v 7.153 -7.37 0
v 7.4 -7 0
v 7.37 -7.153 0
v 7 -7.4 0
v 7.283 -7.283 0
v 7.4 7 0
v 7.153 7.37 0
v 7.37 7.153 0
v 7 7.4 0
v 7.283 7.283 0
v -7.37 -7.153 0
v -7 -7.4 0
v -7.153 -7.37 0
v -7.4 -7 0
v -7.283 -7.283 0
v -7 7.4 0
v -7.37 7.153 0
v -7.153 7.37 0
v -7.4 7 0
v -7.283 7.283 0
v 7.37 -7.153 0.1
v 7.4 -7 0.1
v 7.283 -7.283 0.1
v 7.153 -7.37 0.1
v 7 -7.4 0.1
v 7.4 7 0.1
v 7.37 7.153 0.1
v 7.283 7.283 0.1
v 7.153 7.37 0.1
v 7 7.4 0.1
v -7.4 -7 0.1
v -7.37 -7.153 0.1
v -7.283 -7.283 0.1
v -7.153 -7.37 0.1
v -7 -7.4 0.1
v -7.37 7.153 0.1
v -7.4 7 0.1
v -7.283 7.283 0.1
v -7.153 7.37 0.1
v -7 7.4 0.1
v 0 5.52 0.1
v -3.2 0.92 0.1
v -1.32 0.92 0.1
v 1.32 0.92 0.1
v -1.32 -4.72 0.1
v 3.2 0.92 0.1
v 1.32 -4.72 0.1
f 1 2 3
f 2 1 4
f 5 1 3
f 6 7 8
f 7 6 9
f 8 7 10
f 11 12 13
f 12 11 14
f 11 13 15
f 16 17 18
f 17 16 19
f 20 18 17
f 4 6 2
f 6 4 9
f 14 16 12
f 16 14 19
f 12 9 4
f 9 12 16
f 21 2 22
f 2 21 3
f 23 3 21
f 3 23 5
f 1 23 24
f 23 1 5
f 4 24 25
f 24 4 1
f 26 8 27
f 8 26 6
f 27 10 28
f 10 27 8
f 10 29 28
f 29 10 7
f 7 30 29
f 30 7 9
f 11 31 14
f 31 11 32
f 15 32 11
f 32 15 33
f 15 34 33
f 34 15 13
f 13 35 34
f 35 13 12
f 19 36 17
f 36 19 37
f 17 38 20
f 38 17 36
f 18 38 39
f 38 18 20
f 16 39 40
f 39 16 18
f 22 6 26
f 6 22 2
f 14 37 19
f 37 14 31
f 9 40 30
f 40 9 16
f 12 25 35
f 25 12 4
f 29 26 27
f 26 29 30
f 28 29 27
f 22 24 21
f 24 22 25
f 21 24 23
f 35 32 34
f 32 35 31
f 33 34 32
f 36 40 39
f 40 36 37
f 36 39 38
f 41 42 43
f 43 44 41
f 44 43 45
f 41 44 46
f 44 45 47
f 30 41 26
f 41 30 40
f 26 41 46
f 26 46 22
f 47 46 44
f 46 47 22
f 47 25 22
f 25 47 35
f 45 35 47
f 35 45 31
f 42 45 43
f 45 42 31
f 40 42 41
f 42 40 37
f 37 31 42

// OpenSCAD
// file: ../p/1-4cyli.scad
use <../lib.scad>
function ldraw_lib__1_4cyli() = [
// 0 Cylinder 0.25
// 0 Name: 1-4cyli.dat
// 0 Author: James Jessiman
// 0 !LDRAW_ORG Primitive UPDATE 2012-01
// 0 !LICENSE Licensed under CC BY 4.0 : see CAreadme.txt
// 
// 0 BFC CERTIFY CCW
  [0,"BFC","CERTIFY"],
  [0,"BFC","CCW"],
// 
// 0 !HISTORY 2002-03-23 [sbliss] Added BFC statement.
// 0 !HISTORY 2002-04-25 [PTadmin] Official Update 2002-02
// 0 !HISTORY 2007-06-22 [PTadmin] Header formatted for Contributor Agreement
// 0 !HISTORY 2008-07-01 [PTadmin] Official Update 2008-01
// 0 !HISTORY 2012-02-16 [Philo] Changed to CCW
// 0 !HISTORY 2012-03-30 [PTadmin] Official Update 2012-01
// 
// 
// 4 16 1 1 0 0.9239 1 0.3827 0.9239 0 0.3827 1 0 0
  [4,16,1,1,0,0.9239,1,0.3827,0.9239,0,0.3827,1,0,0],
// 5 24 1 0 0 1 1 0 0.9239 0 0.3827 1 0 -1
  [5,24,1,0,0,1,1,0,0.9239,0,0.3827,1,0,-1],
// 4 16 0.9239 1 0.3827 0.7071 1 0.7071 0.7071 0 0.7071 0.9239 0 0.3827
  [4,16,0.9239,1,0.3827,0.7071,1,0.7071,0.7071,0,0.7071,0.9239,0,0.3827],
// 5 24 0.9239 0 0.3827 0.9239 1 0.3827 0.7071 0 0.7071 1 0 0
  [5,24,0.9239,0,0.3827,0.9239,1,0.3827,0.7071,0,0.7071,1,0,0],
// 4 16 0.7071 1 0.7071 0.3827 1 0.9239 0.3827 0 0.9239 0.7071 0 0.7071
  [4,16,0.7071,1,0.7071,0.3827,1,0.9239,0.3827,0,0.9239,0.7071,0,0.7071],
// 5 24 0.7071 0 0.7071 0.7071 1 0.7071 0.3827 0 0.9239 0.9239 0 0.3827
  [5,24,0.7071,0,0.7071,0.7071,1,0.7071,0.3827,0,0.9239,0.9239,0,0.3827],
// 4 16 0.3827 1 0.9239 0 1 1 0 0 1 0.3827 0 0.9239
  [4,16,0.3827,1,0.9239,0,1,1,0,0,1,0.3827,0,0.9239],
// 5 24 0.3827 0 0.9239 0.3827 1 0.9239 0 0 1 0.7071 0 0.7071
  [5,24,0.3827,0,0.9239,0.3827,1,0.9239,0,0,1,0.7071,0,0.7071],
// 5 24 0 0 1 0 1 1 0.3827 0 0.9239 -1 0 1
  [5,24,0,0,1,0,1,1,0.3827,0,0.9239,-1,0,1],
];
module ldraw_lib__1_4cyli(step=0, col=false, unit=2/5, alt=false, line=0.2, solid=!$preview)
    makepoly(ldraw_lib__1_4cyli(), step=step, col=col, unit=unit, alt=alt, line=line, solid=solid);
ldraw_lib__1_4cyli(line=0.2);
// file: ../p/1-4chrd.scad
use <../lib.scad>
function ldraw_lib__1_4chrd() = [
// 0 Chord 0.25
// 0 Name: 1-4chrd.dat
// 0 Author: Max Martin Richter [MMR1988]
// 0 !LDRAW_ORG Primitive UPDATE 2023-05
// 0 !LICENSE Licensed under CC BY 4.0 : see CAreadme.txt
// 
// 0 BFC CERTIFY CCW
  [0,"BFC","CERTIFY"],
  [0,"BFC","CCW"],
// 
// 0 !HISTORY 2004-04-22 [PTadmin] Official Update 2004-02
// 0 !HISTORY 2007-10-09 [PTadmin] Header formatted for Contributor Agreement
// 0 !HISTORY 2008-07-01 [PTadmin] Official Update 2008-01
// 0 !HISTORY 2012-08-02 [MMR1988] Re-creation with PrimGen2 and Rectifier
// 0 !HISTORY 2012-08-09 [PTadmin] Official Update 2012-02
// 0 !HISTORY 2023-10-27 [OrionP] Change author to MMR1988 from hafhead
// 0 !HISTORY 2023-10-31 [OrionP] Official Update 2023-05
// 
// 4 16 0.9239 0 0.3827 0.3827 0 0.9239 0 0 1 1 0 0
  [4,16,0.9239,0,0.3827,0.3827,0,0.9239,0,0,1,1,0,0],
// 3 16 0.7071 0 0.7071 0.3827 0 0.9239 0.9239 0 0.3827
  [3,16,0.7071,0,0.7071,0.3827,0,0.9239,0.9239,0,0.3827],
];
module ldraw_lib__1_4chrd(step=0, col=false, unit=2/5, alt=false, line=0.2, solid=!$preview)
    makepoly(ldraw_lib__1_4chrd(), step=step, col=col, unit=unit, alt=alt, line=line, solid=solid);
ldraw_lib__1_4chrd(line=0.2);
// main file
use <../lib.scad>
use <../p/1-4chrd.scad>
use <../p/1-4cyli.scad>
function ldraw_lib__6429457g() = [
// 0 Sticker  1.9 x  1.9 with Yellow Arrow on Black Background
// 0 Name: 6429457g.dat
// 0 Author: Gabriel Läufer [Dr.Bricktacular]
// 0 !LDRAW_ORG Part UPDATE 2025-02
// 0 !LICENSE Licensed under CC BY 4.0 : see CAreadme.txt
// 
// 0 BFC CERTIFY CCW
  [0,"BFC","CERTIFY"],
  [0,"BFC","CCW"],
// 
// 0 !KEYWORDS Blacktron Cruiser, Blacktron I, Bricklink 40580stk01
// 0 !KEYWORDS Brickowl 402277, Rebrickable 10102362, Set 40580
// 
// 0 !HISTORY 2025-02-27 [OrionP] Official Update 2025-02
// 
// 0 // Sticker-Bottom
// 1 16 17.5 0 -17.5 1 0 0 0 -1 0 0 0 -1 1-4chrd.dat
  [1,16,17.5,0,-17.5,1,0,0,0,-1,0,0,0,-1, ldraw_lib__1_4chrd()],
// 1 16 17.5 0 17.5 1 0 0 0 -1 0 0 0 1 1-4chrd.dat
  [1,16,17.5,0,17.5,1,0,0,0,-1,0,0,0,1, ldraw_lib__1_4chrd()],
// 1 16 -17.5 0 -17.5 -1 0 0 0 -1 0 0 0 -1 1-4chrd.dat
  [1,16,-17.5,0,-17.5,-1,0,0,0,-1,0,0,0,-1, ldraw_lib__1_4chrd()],
// 1 16 -17.5 0 17.5 -1 0 0 0 -1 0 0 0 1 1-4chrd.dat
  [1,16,-17.5,0,17.5,-1,0,0,0,-1,0,0,0,1, ldraw_lib__1_4chrd()],
// 4 16 18.5 0 17.5 18.5 0 -17.5 17.5 0 -18.5 17.5 0 18.5
  [4,16,18.5,0,17.5,18.5,0,-17.5,17.5,0,-18.5,17.5,0,18.5],
// 4 16 -18.5 0 17.5 -17.5 0 18.5 -17.5 0 -18.5 -18.5 0 -17.5
  [4,16,-18.5,0,17.5,-17.5,0,18.5,-17.5,0,-18.5,-18.5,0,-17.5],
// 4 16 17.5 0 18.5 17.5 0 -18.5 -17.5 0 -18.5 -17.5 0 18.5
  [4,16,17.5,0,18.5,17.5,0,-18.5,-17.5,0,-18.5,-17.5,0,18.5],
// 
// 0 // Sticker-Side
// 1 16 17.5 -0.25 -17.5 1 0 0 0 0.25 0 0 0 -1 1-4cyli.dat
  [1,16,17.5,-0.25,-17.5,1,0,0,0,0.25,0,0,0,-1, ldraw_lib__1_4cyli()],
// 1 16 17.5 -0.25 17.5 1 0 0 0 0.25 0 0 0 1 1-4cyli.dat
  [1,16,17.5,-0.25,17.5,1,0,0,0,0.25,0,0,0,1, ldraw_lib__1_4cyli()],
// 1 16 -17.5 -0.25 -17.5 -1 0 0 0 0.25 0 0 0 -1 1-4cyli.dat
  [1,16,-17.5,-0.25,-17.5,-1,0,0,0,0.25,0,0,0,-1, ldraw_lib__1_4cyli()],
// 1 16 -17.5 -0.25 17.5 -1 0 0 0 0.25 0 0 0 1 1-4cyli.dat
  [1,16,-17.5,-0.25,17.5,-1,0,0,0,0.25,0,0,0,1, ldraw_lib__1_4cyli()],
// 4 16 18.5 0 17.5 18.5 -0.25 17.5 18.5 -0.25 -17.5 18.5 0 -17.5
  [4,16,18.5,0,17.5,18.5,-0.25,17.5,18.5,-0.25,-17.5,18.5,0,-17.5],
// 4 16 -18.5 0 17.5 -18.5 0 -17.5 -18.5 -0.25 -17.5 -18.5 -0.25 17.5
  [4,16,-18.5,0,17.5,-18.5,0,-17.5,-18.5,-0.25,-17.5,-18.5,-0.25,17.5],
// 4 16 -17.5 0 18.5 -17.5 -0.25 18.5 17.5 -0.25 18.5 17.5 0 18.5
  [4,16,-17.5,0,18.5,-17.5,-0.25,18.5,17.5,-0.25,18.5,17.5,0,18.5],
// 4 16 -17.5 0 -18.5 17.5 0 -18.5 17.5 -0.25 -18.5 -17.5 -0.25 -18.5
  [4,16,-17.5,0,-18.5,17.5,0,-18.5,17.5,-0.25,-18.5,-17.5,-0.25,-18.5],
// 
// 0 // Sticker-Front
// 1 0 17.5 -0.25 17.5 1 0 0 0 1 0 0 0 1 1-4chrd.dat
  [1,0,17.5,-0.25,17.5,1,0,0,0,1,0,0,0,1, ldraw_lib__1_4chrd()],
// 1 0 17.5 -0.25 -17.5 1 0 0 0 1 0 0 0 -1 1-4chrd.dat
  [1,0,17.5,-0.25,-17.5,1,0,0,0,1,0,0,0,-1, ldraw_lib__1_4chrd()],
// 1 0 -17.5 -0.25 -17.5 -1 0 0 0 1 0 0 0 -1 1-4chrd.dat
  [1,0,-17.5,-0.25,-17.5,-1,0,0,0,1,0,0,0,-1, ldraw_lib__1_4chrd()],
// 1 0 -17.5 -0.25 17.5 -1 0 0 0 1 0 0 0 1 1-4chrd.dat
  [1,0,-17.5,-0.25,17.5,-1,0,0,0,1,0,0,0,1, ldraw_lib__1_4chrd()],
// 3 14 0 -0.25 13.8 -8 -0.25 2.3 -3.3 -0.25 2.3
  [3,14,0,-0.25,13.8,-8,-0.25,2.3,-3.3,-0.25,2.3],
// 4 14 3.3 -0.25 2.3 0 -0.25 13.8 -3.3 -0.25 2.3 -3.3 -0.25 -11.8
  [4,14,3.3,-0.25,2.3,0,-0.25,13.8,-3.3,-0.25,2.3,-3.3,-0.25,-11.8],
// 3 14 0 -0.25 13.8 3.3 -0.25 2.3 8 -0.25 2.3
  [3,14,0,-0.25,13.8,3.3,-0.25,2.3,8,-0.25,2.3],
// 3 14 3.3 -0.25 2.3 -3.3 -0.25 -11.8 3.3 -0.25 -11.8
  [3,14,3.3,-0.25,2.3,-3.3,-0.25,-11.8,3.3,-0.25,-11.8],
// 4 0 17.5 -0.25 18.5 -17.5 -0.25 18.5 0 -0.25 13.8 18.5 -0.25 17.5
  [4,0,17.5,-0.25,18.5,-17.5,-0.25,18.5,0,-0.25,13.8,18.5,-0.25,17.5],
// 3 0 18.5 -0.25 17.5 0 -0.25 13.8 8 -0.25 2.3
  [3,0,18.5,-0.25,17.5,0,-0.25,13.8,8,-0.25,2.3],
// 3 0 18.5 -0.25 17.5 8 -0.25 2.3 18.5 -0.25 -17.5
  [3,0,18.5,-0.25,17.5,8,-0.25,2.3,18.5,-0.25,-17.5],
// 4 0 18.5 -0.25 -17.5 8 -0.25 2.3 3.3 -0.25 2.3 3.3 -0.25 -11.8
  [4,0,18.5,-0.25,-17.5,8,-0.25,2.3,3.3,-0.25,2.3,3.3,-0.25,-11.8],
// 4 0 17.5 -0.25 -18.5 18.5 -0.25 -17.5 3.3 -0.25 -11.8 -17.5 -0.25 -18.5
  [4,0,17.5,-0.25,-18.5,18.5,-0.25,-17.5,3.3,-0.25,-11.8,-17.5,-0.25,-18.5],
// 4 0 -17.5 -0.25 -18.5 3.3 -0.25 -11.8 -3.3 -0.25 -11.8 -18.5 -0.25 -17.5
  [4,0,-17.5,-0.25,-18.5,3.3,-0.25,-11.8,-3.3,-0.25,-11.8,-18.5,-0.25,-17.5],
// 4 0 -18.5 -0.25 -17.5 -3.3 -0.25 -11.8 -3.3 -0.25 2.3 -8 -0.25 2.3
  [4,0,-18.5,-0.25,-17.5,-3.3,-0.25,-11.8,-3.3,-0.25,2.3,-8,-0.25,2.3],
// 4 0 0 -0.25 13.8 -17.5 -0.25 18.5 -18.5 -0.25 17.5 -8 -0.25 2.3
  [4,0,0,-0.25,13.8,-17.5,-0.25,18.5,-18.5,-0.25,17.5,-8,-0.25,2.3],
// 3 0 -18.5 -0.25 17.5 -18.5 -0.25 -17.5 -8 -0.25 2.3
  [3,0,-18.5,-0.25,17.5,-18.5,-0.25,-17.5,-8,-0.25,2.3],
];
module ldraw_lib__6429457g(step=0, col=false, unit=2/5, alt=false, line=0.2, solid=!$preview)
    makepoly(ldraw_lib__6429457g(), step=step, col=col, unit=unit, alt=alt, line=line, solid=solid);
ldraw_lib__6429457g(line=0.2);
